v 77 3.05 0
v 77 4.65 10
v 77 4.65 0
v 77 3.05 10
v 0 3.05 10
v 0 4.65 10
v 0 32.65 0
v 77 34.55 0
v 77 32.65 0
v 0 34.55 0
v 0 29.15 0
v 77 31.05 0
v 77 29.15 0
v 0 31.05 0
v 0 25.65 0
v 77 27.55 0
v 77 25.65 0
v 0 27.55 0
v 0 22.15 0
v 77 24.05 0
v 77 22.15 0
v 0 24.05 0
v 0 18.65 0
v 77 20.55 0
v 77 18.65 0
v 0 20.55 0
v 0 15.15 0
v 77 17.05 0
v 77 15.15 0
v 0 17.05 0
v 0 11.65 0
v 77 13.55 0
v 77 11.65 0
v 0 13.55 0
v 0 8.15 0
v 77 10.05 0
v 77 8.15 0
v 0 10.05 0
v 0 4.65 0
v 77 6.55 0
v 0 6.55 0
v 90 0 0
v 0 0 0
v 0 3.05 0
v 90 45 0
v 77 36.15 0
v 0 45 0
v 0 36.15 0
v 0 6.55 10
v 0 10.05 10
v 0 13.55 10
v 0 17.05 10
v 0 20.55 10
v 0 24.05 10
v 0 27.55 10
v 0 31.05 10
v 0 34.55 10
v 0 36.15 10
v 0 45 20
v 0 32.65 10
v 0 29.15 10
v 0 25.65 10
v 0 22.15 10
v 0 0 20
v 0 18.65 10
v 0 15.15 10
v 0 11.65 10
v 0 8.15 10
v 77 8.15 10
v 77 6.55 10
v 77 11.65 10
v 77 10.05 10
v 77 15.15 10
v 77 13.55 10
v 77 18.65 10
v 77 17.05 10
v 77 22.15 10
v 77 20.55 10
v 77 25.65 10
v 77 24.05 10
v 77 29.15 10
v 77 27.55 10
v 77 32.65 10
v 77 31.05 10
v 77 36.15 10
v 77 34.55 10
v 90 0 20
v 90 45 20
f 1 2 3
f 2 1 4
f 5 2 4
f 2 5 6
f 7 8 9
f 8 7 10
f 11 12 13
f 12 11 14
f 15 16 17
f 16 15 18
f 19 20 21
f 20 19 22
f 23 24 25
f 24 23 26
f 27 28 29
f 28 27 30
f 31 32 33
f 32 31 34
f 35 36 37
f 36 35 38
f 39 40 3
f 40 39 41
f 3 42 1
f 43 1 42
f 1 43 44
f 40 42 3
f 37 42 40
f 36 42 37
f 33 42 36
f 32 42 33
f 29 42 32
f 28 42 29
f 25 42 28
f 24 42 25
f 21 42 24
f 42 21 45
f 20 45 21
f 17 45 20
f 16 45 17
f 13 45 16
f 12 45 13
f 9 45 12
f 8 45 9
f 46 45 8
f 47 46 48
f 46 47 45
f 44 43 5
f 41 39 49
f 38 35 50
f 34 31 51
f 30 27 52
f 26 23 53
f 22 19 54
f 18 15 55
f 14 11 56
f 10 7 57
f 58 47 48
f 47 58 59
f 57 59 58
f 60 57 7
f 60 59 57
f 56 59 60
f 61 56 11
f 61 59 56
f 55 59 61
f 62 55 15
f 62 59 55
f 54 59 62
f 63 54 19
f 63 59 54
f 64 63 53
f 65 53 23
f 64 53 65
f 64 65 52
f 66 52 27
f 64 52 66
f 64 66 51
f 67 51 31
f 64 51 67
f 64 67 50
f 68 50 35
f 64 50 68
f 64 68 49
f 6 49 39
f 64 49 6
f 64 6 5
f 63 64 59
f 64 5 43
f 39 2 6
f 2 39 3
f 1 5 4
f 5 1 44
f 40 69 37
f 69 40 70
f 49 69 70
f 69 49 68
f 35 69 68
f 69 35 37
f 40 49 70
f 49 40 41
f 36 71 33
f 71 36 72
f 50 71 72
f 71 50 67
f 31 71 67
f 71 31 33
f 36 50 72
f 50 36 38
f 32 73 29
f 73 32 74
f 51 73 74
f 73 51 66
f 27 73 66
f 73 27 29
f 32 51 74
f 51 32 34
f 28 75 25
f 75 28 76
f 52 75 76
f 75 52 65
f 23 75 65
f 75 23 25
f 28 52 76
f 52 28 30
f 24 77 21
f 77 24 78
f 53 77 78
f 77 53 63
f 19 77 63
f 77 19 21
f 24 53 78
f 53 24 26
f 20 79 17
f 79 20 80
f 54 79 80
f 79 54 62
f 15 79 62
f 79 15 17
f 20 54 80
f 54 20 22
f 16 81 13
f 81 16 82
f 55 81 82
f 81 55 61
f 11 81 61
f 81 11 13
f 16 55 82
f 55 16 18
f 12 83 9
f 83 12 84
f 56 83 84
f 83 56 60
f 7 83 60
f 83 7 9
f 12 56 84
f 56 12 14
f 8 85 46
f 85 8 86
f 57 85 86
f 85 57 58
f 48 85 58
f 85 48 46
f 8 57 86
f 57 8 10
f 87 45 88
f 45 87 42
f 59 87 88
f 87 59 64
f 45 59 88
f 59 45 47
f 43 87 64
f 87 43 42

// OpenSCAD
// Slide drying rack - a solid base block with a row of parallel slots standing up on their long
// edge, for drying 10 x 75 mm microscope slides. NOVEL general part.
//

slides = 10;
base_l = 90;
base_w = 45;
base_h = 20;
slot_l = 77;
slot_w = 1.6;
slot_d = 10;
pitch   = 3.5;

$fn = 48;

margin = slot_w / 2 + pitch / 2 + 0.5;
w      = base_w - 2 * margin;

difference() {
    cube([base_l, base_w, base_h]);
    for (i = [0 : slides - 1])
        translate([0, margin + i * pitch, 0]) cube([slot_l, slot_w, slot_d]);
}
